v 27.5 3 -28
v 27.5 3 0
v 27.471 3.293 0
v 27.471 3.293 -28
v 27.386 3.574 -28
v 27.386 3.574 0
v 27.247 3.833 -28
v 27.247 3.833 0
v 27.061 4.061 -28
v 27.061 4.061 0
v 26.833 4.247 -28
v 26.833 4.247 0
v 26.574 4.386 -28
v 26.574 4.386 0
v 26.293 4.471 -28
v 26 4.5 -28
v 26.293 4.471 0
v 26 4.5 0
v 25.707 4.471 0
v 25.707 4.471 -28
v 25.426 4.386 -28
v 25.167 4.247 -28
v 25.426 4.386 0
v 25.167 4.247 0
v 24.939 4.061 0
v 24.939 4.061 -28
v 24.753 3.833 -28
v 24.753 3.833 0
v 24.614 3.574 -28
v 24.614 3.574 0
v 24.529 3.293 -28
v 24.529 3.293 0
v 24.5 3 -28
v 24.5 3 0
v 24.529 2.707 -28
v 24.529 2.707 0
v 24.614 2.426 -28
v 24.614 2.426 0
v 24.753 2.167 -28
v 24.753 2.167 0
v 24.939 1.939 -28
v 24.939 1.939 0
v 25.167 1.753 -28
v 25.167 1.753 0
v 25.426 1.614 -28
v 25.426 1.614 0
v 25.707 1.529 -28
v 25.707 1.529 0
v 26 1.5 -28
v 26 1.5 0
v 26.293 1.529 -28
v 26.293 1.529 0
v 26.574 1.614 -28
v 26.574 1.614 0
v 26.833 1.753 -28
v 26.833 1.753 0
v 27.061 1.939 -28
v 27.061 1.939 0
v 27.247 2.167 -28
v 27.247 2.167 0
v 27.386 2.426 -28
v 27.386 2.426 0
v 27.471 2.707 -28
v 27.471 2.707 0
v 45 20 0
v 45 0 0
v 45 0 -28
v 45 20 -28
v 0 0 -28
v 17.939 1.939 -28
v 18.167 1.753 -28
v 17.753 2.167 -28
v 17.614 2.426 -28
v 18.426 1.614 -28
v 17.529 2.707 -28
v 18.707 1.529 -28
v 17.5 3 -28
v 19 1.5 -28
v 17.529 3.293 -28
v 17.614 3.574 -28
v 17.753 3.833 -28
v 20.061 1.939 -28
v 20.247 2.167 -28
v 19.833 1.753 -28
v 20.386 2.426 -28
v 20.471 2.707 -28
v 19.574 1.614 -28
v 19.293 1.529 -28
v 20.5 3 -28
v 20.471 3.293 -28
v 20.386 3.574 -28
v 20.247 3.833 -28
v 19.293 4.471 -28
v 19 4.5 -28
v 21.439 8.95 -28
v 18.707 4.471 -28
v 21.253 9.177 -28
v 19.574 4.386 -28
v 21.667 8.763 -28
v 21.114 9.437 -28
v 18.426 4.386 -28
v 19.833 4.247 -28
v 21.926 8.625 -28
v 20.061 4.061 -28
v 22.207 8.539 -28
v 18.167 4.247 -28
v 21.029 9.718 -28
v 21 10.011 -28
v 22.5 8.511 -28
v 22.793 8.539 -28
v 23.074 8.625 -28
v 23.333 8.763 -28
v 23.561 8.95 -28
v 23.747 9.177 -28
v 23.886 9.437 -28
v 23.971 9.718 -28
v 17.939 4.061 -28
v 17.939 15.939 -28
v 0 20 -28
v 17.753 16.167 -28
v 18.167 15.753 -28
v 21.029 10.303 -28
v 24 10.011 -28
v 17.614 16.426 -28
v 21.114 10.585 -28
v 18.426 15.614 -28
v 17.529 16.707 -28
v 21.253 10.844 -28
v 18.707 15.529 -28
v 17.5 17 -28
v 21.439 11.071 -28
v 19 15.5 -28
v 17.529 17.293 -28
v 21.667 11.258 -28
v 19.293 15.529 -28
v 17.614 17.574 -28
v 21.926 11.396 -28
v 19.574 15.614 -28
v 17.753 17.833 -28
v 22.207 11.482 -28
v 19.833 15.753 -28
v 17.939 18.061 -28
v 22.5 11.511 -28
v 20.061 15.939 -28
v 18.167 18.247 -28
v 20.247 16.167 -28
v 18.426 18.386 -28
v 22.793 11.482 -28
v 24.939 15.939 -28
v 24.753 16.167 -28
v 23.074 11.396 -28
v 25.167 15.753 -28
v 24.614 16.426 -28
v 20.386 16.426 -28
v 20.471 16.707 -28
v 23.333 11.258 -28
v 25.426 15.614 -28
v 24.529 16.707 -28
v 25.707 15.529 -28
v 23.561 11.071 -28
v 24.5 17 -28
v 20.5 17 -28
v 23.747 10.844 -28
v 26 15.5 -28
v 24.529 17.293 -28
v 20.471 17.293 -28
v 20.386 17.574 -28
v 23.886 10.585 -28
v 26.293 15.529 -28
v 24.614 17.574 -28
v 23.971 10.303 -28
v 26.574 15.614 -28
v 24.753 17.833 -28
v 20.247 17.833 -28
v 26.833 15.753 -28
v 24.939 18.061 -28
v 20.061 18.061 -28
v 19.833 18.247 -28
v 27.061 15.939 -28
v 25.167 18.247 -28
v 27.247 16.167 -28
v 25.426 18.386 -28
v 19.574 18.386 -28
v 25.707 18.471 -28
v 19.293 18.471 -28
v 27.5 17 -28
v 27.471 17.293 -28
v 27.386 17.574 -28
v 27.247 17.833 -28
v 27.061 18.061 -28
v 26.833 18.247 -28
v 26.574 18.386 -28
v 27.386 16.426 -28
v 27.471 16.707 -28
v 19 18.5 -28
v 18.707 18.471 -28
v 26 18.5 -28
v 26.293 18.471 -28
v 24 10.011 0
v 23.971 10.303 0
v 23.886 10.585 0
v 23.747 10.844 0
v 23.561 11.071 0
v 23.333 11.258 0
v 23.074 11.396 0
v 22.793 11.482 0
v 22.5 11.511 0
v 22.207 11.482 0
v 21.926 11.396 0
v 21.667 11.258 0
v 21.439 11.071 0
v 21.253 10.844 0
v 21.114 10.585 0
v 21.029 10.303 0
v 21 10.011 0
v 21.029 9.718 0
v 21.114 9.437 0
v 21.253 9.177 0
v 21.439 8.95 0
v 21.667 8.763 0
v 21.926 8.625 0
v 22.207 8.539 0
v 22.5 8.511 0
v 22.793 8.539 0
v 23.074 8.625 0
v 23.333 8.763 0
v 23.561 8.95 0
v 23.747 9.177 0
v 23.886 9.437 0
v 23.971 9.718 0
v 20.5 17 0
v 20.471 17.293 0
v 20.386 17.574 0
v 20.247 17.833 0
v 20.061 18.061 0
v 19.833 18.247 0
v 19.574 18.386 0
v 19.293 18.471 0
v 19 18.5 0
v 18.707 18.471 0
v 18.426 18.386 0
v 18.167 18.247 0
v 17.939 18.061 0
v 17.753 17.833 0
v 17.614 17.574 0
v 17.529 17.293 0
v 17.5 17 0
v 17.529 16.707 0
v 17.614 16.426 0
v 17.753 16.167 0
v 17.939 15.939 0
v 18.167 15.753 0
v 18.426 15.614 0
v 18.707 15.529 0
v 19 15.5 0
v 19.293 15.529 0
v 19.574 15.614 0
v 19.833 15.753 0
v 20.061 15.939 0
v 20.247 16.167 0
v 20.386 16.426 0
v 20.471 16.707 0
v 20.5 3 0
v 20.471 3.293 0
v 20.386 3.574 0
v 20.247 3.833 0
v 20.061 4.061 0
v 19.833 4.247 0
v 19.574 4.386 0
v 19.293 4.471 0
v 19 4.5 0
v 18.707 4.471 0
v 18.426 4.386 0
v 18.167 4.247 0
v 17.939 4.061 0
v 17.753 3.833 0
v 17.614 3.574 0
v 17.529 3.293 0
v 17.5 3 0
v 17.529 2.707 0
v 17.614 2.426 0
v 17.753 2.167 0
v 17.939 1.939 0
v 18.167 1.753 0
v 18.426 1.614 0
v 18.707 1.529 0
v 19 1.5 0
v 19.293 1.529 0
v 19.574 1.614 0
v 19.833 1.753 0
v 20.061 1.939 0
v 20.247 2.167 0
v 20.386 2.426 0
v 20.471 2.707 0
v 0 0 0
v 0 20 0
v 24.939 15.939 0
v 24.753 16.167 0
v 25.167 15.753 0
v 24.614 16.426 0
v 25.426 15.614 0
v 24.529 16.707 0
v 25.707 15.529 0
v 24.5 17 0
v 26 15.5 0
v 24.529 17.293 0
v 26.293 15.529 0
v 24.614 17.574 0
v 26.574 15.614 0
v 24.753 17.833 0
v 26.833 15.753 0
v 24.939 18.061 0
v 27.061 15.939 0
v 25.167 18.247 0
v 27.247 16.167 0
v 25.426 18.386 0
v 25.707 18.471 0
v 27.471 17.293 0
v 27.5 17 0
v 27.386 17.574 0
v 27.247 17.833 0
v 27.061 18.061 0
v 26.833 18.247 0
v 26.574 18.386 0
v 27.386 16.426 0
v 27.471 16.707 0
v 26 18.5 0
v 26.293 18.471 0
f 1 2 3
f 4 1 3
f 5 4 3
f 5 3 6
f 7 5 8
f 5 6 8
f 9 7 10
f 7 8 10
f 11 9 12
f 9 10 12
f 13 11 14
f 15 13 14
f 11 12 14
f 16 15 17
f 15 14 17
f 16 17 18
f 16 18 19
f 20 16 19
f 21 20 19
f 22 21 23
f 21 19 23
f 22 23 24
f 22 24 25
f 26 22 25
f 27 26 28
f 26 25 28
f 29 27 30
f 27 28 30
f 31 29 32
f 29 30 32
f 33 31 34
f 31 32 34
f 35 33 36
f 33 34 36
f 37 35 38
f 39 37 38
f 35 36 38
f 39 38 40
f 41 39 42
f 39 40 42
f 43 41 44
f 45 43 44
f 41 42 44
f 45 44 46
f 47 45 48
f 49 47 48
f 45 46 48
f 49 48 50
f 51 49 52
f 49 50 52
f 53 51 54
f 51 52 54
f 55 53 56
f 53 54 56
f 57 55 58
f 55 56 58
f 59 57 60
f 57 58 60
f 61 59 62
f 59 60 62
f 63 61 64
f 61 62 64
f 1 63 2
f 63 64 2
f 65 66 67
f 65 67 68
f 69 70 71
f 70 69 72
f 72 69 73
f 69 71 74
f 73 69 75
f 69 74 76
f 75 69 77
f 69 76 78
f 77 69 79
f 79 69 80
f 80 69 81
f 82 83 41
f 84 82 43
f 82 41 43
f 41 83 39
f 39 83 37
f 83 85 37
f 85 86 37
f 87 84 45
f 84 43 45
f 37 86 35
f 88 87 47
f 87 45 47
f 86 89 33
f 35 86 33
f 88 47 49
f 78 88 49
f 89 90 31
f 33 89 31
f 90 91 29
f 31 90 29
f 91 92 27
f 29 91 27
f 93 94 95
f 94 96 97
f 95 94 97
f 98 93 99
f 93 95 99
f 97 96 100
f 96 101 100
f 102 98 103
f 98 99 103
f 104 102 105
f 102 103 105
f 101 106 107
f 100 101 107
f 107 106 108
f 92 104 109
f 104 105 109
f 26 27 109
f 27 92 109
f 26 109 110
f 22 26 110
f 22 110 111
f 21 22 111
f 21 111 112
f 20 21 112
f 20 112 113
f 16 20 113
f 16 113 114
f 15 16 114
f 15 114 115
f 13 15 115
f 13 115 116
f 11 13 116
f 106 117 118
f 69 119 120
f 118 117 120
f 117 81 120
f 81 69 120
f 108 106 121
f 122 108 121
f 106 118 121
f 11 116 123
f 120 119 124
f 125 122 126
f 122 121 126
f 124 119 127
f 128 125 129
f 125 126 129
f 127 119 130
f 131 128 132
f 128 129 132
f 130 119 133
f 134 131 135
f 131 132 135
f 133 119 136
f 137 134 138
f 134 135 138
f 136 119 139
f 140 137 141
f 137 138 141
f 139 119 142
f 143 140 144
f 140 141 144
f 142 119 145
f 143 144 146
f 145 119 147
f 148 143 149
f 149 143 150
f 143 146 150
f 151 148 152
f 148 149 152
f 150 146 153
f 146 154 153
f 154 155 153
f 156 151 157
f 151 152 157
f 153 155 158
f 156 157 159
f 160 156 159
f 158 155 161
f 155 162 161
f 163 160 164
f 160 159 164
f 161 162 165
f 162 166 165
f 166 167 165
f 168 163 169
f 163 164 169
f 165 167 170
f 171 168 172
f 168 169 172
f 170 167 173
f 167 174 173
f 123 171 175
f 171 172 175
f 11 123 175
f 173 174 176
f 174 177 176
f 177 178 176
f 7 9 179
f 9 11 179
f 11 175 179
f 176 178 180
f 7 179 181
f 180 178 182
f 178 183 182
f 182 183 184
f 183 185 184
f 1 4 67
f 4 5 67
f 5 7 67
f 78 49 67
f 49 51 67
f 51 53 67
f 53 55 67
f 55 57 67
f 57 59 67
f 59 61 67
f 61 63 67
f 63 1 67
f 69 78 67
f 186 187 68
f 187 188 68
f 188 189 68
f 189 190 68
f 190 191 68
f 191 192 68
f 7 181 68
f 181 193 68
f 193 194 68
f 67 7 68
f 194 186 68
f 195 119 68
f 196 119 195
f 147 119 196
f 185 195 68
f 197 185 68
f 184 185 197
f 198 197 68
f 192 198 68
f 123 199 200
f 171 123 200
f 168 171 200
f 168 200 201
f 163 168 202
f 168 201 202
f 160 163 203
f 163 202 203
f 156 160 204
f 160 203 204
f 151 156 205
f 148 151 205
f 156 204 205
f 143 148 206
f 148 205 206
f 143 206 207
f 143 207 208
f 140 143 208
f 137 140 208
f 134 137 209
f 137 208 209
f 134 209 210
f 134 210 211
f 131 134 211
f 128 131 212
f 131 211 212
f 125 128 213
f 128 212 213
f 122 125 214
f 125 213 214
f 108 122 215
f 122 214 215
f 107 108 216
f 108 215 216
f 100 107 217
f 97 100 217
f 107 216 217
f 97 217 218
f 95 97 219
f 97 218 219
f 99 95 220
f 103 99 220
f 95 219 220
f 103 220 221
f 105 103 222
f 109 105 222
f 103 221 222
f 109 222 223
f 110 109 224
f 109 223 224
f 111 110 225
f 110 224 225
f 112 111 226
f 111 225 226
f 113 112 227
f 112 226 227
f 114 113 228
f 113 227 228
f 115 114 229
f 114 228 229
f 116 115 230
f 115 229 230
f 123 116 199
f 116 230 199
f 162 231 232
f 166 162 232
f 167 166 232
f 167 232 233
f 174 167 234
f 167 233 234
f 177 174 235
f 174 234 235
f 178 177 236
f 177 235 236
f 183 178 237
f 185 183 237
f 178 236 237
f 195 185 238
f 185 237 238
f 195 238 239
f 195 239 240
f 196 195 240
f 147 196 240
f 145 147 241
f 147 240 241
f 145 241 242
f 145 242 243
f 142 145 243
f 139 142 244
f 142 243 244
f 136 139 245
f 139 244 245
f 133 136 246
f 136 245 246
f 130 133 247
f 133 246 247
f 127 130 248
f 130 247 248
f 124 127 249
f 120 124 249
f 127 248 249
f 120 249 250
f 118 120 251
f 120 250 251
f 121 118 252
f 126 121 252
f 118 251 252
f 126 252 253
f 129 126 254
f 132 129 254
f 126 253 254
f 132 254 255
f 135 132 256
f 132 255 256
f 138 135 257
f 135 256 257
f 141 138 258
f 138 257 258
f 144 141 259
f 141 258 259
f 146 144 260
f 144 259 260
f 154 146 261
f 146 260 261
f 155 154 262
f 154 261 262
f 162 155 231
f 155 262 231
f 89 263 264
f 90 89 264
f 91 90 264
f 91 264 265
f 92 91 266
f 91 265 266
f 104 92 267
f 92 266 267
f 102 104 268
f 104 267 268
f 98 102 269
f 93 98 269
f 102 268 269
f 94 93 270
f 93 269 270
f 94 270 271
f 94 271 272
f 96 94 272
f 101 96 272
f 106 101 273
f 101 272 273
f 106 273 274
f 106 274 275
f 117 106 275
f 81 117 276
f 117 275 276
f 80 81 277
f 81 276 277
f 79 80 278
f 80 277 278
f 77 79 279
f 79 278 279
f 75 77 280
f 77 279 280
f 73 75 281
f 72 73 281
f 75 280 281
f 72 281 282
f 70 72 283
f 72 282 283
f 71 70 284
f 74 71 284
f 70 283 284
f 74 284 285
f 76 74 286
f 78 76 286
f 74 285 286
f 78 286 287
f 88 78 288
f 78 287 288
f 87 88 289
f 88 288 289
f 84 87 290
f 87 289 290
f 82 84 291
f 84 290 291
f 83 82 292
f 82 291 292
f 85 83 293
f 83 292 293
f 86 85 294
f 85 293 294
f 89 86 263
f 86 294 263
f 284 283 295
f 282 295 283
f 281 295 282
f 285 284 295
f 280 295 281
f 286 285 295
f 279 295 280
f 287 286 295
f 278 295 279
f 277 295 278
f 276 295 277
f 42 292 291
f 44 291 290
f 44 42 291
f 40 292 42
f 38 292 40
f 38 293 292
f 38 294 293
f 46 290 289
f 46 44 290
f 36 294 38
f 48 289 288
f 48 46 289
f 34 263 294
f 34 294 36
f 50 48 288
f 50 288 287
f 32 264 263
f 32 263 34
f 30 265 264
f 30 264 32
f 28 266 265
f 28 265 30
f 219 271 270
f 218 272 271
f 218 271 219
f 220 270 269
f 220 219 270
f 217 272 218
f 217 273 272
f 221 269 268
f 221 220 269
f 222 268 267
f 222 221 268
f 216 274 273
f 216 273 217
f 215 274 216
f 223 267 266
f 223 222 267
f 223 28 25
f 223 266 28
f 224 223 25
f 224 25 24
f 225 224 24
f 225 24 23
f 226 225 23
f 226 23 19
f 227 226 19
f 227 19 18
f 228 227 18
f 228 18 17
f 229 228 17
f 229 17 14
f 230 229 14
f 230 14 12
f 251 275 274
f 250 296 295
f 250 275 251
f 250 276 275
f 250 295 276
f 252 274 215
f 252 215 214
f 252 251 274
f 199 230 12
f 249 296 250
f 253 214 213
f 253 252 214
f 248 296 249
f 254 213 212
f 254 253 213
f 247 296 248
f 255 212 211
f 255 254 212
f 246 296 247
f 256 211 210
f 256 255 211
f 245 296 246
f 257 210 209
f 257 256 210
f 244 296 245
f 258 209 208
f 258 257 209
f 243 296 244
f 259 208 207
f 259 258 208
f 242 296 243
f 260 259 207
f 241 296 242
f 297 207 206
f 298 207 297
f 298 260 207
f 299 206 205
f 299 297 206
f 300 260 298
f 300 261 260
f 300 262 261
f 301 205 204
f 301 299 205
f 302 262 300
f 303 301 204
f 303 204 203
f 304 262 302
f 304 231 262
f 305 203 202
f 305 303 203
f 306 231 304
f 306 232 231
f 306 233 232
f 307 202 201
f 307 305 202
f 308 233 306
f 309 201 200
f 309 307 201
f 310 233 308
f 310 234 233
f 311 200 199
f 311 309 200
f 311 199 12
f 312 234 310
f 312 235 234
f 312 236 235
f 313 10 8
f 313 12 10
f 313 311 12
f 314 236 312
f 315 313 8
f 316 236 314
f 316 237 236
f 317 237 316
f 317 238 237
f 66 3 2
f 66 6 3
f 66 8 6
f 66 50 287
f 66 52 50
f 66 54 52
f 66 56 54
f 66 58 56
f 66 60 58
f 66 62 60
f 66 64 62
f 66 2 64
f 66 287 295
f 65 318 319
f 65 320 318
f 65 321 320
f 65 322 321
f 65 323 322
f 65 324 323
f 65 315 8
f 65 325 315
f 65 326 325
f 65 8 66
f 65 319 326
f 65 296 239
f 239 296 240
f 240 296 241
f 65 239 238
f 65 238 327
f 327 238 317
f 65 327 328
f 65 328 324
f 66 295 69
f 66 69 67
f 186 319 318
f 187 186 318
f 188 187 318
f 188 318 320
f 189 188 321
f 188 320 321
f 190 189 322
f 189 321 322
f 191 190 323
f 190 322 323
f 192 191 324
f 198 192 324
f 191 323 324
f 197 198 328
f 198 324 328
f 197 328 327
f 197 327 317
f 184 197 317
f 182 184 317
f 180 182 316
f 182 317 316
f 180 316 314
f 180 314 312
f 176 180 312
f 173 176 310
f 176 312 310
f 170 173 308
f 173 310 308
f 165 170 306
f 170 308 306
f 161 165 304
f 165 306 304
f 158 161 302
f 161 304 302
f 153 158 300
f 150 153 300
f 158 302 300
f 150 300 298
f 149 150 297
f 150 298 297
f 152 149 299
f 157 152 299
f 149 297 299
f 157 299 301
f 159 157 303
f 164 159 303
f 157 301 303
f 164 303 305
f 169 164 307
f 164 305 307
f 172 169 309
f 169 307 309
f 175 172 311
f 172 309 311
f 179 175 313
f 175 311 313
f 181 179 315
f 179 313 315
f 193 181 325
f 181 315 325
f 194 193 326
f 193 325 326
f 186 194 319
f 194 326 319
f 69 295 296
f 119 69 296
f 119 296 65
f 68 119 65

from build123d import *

# Parameters (mm, degrees)
SKETCH2_W           = 45
SKETCH2_H           = 20
BOSS_EXTRUDE1_DEPTH = 28
SKETCH3_R           = 1.5
CUT_EXTRUDE1_DEPTH  = 28


with BuildPart() as part:
    # Sketch2 → Boss-Extrude1 (new body)
    with BuildSketch(Plane.XY):
        with Locations((22.5, 10)):
            Rectangle(SKETCH2_W, SKETCH2_H)
    extrude(amount=-BOSS_EXTRUDE1_DEPTH)

    # Sketch3 → Cut-Extrude1 (cut)
    with BuildSketch(Plane.XY):
        with Locations((22.5, 10.010662988)):
            Circle(SKETCH3_R)
        with Locations((19, 17.000059599)):
            Circle(SKETCH3_R)
        with Locations((19, 2.999940401)):
            Circle(SKETCH3_R)
        with Locations((26, 2.999940401)):
            Circle(SKETCH3_R)
        with Locations((26, 17.000059599)):
            Circle(SKETCH3_R)
    extrude(amount=-CUT_EXTRUDE1_DEPTH, mode=Mode.SUBTRACT)


solid = part.part
